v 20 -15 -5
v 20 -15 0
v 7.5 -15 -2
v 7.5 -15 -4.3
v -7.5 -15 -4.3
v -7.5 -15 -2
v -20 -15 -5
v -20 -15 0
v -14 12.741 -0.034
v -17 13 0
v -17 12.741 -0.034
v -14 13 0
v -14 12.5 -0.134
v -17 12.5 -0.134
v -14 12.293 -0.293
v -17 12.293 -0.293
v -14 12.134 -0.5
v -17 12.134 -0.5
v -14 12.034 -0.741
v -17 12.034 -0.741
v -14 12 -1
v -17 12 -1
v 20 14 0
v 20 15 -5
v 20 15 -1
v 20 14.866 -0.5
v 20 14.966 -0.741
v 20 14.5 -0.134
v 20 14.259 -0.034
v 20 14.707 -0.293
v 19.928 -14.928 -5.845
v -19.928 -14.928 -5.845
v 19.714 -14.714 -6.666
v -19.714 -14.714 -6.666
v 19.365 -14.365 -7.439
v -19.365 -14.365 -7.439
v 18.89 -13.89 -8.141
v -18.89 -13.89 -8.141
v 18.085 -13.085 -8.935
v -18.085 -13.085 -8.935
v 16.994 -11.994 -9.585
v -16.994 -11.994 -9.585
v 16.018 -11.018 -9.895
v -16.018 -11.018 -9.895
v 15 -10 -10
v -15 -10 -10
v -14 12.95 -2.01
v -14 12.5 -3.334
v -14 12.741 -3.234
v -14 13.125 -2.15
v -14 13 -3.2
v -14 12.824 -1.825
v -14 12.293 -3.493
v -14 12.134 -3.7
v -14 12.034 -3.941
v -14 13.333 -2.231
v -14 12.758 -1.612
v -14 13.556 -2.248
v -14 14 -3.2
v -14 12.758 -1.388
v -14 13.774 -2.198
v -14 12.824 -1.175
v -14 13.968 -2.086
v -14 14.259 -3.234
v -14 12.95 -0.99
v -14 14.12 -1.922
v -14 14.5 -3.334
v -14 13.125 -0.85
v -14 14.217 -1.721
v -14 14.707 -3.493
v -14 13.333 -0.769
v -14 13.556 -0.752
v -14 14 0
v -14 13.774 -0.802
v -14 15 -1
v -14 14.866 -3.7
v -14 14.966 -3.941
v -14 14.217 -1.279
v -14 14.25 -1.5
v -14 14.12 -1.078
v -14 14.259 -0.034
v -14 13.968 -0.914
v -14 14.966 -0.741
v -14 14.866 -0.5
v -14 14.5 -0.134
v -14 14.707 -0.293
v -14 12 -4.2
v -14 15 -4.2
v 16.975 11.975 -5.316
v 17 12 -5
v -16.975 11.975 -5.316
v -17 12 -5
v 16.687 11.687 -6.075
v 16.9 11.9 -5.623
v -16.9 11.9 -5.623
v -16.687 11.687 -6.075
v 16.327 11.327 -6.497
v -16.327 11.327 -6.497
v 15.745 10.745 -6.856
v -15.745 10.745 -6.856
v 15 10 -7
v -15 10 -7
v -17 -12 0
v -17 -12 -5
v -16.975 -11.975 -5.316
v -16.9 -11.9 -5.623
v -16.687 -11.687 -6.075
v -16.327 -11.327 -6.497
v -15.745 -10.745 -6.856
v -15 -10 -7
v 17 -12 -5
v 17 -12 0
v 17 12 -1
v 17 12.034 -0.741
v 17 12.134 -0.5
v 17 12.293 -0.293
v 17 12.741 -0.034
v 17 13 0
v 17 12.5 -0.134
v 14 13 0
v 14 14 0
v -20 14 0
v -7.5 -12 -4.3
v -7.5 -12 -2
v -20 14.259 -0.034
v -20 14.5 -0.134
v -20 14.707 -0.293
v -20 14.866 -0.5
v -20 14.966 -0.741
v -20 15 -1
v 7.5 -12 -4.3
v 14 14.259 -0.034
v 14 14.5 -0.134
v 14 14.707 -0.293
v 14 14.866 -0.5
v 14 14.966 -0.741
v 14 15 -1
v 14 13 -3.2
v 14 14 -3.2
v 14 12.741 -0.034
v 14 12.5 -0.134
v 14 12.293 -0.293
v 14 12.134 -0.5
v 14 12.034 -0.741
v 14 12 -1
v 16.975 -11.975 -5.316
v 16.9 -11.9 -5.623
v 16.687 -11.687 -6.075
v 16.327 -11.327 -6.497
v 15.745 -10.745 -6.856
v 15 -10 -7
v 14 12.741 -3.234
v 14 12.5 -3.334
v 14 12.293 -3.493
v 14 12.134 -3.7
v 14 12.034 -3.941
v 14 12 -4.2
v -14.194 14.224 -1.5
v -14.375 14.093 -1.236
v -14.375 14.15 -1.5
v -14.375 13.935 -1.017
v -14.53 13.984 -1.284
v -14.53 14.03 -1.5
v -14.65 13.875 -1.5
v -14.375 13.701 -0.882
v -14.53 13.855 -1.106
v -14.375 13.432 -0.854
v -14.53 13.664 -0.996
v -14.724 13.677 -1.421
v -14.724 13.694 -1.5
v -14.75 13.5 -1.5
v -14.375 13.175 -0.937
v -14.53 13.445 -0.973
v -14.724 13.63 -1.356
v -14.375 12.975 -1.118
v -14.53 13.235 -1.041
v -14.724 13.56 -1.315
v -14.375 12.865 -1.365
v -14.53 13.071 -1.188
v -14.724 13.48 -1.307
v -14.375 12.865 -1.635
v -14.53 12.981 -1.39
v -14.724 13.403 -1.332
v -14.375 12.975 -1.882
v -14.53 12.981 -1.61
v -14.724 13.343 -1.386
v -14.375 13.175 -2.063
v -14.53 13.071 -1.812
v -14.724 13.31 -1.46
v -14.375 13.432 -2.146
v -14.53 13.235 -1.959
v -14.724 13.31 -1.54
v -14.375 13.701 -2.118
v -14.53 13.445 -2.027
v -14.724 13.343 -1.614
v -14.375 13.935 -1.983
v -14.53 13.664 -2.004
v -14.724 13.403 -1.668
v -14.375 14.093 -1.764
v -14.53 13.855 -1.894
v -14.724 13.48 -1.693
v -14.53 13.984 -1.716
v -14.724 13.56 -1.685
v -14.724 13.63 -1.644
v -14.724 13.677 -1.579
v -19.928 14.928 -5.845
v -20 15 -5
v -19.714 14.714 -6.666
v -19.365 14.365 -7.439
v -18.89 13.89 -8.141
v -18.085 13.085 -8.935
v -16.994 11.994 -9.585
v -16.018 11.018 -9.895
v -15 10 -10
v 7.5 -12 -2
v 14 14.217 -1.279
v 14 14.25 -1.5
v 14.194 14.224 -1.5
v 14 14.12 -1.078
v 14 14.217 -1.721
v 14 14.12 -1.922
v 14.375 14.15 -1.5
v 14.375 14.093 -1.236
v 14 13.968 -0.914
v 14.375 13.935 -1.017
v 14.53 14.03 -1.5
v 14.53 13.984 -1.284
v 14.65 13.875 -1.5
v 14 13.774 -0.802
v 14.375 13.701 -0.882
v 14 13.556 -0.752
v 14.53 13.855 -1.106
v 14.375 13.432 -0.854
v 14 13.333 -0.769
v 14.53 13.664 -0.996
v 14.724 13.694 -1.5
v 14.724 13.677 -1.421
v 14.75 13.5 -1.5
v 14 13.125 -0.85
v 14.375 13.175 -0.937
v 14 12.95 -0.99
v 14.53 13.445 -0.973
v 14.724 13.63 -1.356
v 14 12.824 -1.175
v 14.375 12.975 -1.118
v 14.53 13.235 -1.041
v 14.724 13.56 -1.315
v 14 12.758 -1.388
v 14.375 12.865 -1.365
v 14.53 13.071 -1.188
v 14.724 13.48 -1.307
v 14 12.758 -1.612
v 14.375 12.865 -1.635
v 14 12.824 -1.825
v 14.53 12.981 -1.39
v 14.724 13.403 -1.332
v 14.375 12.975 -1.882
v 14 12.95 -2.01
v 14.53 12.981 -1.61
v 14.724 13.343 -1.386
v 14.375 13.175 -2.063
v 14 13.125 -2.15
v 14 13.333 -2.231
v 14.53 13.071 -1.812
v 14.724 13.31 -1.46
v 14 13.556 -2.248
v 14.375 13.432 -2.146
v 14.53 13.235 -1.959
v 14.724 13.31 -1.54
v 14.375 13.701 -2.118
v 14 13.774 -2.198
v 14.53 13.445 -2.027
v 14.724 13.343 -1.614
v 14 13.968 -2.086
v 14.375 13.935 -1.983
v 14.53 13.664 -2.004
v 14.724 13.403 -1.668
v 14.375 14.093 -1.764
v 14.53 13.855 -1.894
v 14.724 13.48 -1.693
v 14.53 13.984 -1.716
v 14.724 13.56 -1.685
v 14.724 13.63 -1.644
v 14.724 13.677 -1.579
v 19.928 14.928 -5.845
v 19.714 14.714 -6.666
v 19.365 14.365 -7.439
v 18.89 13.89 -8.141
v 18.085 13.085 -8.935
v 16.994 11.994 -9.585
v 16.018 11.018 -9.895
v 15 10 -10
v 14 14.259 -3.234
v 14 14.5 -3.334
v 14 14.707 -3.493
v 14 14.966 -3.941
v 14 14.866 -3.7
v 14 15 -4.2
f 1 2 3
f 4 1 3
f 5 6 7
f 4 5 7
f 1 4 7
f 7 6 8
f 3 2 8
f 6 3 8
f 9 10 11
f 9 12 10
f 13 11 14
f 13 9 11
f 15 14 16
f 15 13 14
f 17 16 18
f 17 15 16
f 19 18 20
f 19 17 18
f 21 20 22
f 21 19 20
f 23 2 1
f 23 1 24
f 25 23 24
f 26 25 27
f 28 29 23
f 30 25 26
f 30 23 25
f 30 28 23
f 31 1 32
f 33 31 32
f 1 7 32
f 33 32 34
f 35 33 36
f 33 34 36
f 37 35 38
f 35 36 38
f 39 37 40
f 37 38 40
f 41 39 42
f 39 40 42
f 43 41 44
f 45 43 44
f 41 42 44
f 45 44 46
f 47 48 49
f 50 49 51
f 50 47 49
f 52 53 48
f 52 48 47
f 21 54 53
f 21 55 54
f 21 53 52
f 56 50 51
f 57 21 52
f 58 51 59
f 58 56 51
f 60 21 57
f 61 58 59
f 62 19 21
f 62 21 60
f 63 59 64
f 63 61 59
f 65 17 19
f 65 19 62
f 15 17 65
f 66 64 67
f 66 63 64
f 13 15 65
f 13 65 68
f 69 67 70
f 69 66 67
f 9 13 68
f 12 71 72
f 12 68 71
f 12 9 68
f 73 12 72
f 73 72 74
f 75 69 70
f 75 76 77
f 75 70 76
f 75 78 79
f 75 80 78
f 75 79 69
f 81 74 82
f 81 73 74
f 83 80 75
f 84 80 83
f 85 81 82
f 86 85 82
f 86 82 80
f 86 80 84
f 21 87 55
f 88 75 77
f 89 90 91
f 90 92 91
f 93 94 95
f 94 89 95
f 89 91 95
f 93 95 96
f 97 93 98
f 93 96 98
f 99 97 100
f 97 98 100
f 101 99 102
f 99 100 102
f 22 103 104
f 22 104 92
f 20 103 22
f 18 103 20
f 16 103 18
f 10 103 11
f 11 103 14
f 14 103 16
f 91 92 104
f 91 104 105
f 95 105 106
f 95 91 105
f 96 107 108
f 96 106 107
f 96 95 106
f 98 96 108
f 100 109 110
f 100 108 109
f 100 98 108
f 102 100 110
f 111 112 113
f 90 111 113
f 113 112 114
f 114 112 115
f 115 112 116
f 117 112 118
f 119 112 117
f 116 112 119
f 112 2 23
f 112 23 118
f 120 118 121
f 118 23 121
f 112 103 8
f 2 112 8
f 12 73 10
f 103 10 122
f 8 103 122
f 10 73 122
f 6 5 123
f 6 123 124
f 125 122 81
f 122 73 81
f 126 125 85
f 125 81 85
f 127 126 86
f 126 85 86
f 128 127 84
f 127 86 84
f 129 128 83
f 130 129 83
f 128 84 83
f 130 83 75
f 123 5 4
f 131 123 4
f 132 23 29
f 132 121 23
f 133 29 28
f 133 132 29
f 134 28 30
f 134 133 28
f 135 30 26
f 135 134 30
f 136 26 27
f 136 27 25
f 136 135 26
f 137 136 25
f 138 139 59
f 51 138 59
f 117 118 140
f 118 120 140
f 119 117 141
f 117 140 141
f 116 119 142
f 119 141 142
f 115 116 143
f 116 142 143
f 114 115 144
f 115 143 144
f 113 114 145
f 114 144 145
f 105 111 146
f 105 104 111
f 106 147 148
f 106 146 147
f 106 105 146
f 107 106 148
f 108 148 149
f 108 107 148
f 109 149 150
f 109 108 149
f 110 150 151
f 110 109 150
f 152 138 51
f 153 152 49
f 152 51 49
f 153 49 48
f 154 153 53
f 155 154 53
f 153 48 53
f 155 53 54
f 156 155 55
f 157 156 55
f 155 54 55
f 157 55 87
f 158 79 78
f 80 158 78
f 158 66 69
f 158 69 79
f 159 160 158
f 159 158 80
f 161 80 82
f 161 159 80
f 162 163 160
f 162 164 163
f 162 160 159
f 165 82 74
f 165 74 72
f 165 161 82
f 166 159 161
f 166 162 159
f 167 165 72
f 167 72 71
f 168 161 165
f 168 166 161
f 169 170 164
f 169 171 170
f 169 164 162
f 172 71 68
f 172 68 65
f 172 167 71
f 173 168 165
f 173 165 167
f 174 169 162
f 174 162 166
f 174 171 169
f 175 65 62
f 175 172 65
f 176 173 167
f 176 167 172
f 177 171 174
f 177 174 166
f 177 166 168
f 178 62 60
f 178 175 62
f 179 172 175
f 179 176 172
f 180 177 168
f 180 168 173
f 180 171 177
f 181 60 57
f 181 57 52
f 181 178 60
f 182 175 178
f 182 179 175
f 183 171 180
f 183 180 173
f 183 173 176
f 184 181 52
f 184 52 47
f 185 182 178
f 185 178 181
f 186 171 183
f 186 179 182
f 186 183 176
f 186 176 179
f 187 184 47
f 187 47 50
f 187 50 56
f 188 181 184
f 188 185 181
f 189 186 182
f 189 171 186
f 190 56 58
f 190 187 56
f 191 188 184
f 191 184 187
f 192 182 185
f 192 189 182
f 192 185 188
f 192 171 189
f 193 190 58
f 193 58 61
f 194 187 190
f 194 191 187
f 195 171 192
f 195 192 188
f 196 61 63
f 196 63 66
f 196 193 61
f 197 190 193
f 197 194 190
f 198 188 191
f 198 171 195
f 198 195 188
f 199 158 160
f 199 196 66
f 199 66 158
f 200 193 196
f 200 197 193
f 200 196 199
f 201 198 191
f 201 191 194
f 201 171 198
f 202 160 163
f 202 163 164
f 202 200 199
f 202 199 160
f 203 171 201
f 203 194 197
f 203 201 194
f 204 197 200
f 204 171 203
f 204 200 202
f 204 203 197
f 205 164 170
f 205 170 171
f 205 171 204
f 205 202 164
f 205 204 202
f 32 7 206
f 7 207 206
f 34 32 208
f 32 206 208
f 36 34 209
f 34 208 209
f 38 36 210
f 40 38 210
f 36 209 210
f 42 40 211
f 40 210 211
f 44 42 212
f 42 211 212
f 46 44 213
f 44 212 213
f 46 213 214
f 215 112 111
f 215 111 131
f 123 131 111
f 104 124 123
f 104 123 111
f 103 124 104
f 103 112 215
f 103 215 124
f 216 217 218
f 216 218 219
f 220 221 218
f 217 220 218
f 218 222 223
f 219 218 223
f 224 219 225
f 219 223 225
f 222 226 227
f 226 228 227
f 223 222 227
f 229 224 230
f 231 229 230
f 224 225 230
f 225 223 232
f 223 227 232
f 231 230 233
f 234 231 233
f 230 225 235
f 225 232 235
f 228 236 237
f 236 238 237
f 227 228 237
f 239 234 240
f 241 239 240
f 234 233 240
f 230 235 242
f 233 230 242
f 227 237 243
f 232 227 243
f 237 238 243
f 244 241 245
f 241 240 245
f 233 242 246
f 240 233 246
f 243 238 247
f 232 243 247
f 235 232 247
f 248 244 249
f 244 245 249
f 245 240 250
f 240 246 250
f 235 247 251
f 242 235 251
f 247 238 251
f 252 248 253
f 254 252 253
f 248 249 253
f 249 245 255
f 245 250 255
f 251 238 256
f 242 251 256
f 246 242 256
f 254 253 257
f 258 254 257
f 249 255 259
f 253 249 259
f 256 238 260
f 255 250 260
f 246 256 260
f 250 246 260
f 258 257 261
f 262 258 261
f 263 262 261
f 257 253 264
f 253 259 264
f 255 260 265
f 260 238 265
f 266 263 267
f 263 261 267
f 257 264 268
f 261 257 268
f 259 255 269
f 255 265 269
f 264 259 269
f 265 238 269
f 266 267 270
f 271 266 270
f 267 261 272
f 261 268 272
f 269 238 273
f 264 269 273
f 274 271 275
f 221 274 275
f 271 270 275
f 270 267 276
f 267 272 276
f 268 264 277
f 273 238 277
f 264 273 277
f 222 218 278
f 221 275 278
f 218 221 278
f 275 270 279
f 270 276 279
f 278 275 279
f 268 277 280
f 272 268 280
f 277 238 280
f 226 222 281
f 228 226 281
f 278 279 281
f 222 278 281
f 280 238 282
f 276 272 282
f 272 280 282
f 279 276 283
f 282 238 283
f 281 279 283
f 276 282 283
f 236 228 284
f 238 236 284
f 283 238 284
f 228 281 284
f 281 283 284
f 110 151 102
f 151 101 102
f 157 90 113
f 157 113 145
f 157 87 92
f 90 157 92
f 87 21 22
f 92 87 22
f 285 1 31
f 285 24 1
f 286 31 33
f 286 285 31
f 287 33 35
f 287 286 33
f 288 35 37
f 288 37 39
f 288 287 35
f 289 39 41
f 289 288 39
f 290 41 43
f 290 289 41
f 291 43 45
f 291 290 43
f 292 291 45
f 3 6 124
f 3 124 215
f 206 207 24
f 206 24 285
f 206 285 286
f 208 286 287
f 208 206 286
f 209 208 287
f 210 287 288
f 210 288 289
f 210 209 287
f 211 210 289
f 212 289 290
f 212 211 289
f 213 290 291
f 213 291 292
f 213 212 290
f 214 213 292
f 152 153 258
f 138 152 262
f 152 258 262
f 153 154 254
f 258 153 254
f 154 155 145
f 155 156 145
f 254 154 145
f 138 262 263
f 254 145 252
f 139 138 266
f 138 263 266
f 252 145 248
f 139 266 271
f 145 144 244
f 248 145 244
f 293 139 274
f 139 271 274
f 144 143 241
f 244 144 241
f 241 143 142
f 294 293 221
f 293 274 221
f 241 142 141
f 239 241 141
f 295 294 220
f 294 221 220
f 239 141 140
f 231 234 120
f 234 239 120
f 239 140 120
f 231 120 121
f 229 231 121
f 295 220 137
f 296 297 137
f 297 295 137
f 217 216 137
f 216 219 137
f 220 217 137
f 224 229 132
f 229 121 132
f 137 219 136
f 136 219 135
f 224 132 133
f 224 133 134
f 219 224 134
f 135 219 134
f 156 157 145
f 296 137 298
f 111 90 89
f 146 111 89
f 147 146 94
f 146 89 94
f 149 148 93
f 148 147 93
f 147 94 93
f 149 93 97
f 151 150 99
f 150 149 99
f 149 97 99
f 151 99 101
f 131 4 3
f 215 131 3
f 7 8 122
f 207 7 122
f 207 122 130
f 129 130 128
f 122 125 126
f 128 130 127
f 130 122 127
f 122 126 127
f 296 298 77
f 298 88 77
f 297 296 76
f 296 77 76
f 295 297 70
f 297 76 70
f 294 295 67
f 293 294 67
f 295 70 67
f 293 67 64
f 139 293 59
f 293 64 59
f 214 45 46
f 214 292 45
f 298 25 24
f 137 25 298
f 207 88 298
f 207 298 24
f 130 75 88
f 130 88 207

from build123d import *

# Parameters (mm, degrees)
F0_W      = 40
F0_H      = 30
F1_DEPTH  = 10
F2_R      = 5
F3_T      = -3
F4_W      = 28
F4_H      = 3
F5_DEPTH  = 3
F6_W      = 32.3581136763
F6_H      = 60.2468792349
F7_DEPTH  = 25
F8_R      = 0.75
F9_DEPTH  = 0.75
F10_R     = 0.74999
F11_W     = 14
F11_H     = 3
F12_DEPTH = 0.2
F13_R     = 1
F15_W     = 15
F15_H     = 2.3
F16_DEPTH = 3


# Not quite as in the source:
# - a fillet or chamfer is up to 0.001 mm smaller than in the source, because OpenCascade refuses the exact size


with BuildPart() as f1:
    # F0 (on Top) → F1 (new body)
    with BuildSketch(Plane.XY):
        Rectangle(F0_W, F0_H)
    extrude(amount=-F1_DEPTH)

    # F2
    f2_edges = [f1.edges().sort_by_distance(p)[0] for p in [
        (20, 0, -10),
        (0, 15, -10),
        (-20, 0, -10),
        (0, -15, -10),
    ]]
    fillet(f2_edges, radius=F2_R)

    # F3
    f3_openings = [f1.faces().sort_by_distance(p)[0] for p in [
        (0, 0, 0),
    ]]
    offset(amount=F3_T, openings=f3_openings)

    # F4 (on face) → F5 (cut)
    with BuildSketch(Plane.XY):
        with Locations((0, 13.5)):
            Rectangle(F4_W, F4_H)
    extrude(amount=-F5_DEPTH, mode=Mode.SUBTRACT)

    # F6 (on Top) → F7 (cut)
    with BuildSketch(Plane.XY):
        with Locations((16.1790568382, -2.0559011027)):
            Rectangle(F6_W, F6_H)
    extrude(amount=-F7_DEPTH, mode=Mode.SUBTRACT)

    # F8 (on face) → F9 (cut)
    with BuildSketch(Plane.YZ.offset(-14)):
        with Locations((13.5, -1.5)):
            Circle(F8_R)
    extrude(amount=-F9_DEPTH, mode=Mode.SUBTRACT)

    # F10 (radius 0.75 in the source; OpenCascade refuses exactly that, so slightly less here)
    f10_edges = [f1.edges().sort_by_distance(p)[0] for p in [
        (-14.75, 12.75, -1.5),
    ]]
    fillet(f10_edges, radius=F10_R)

    # F11 (on face) → F12 (cut)
    with BuildSketch(Plane.XY.offset(-3)):
        with Locations((-7, 13.5)):
            Rectangle(F11_W, F11_H)
    extrude(amount=-F12_DEPTH, mode=Mode.SUBTRACT)

    # F13
    f13_edges = [f1.edges().sort_by_distance(p)[0] for p in [
        (-17, 15, 0),
        (-15.5, 12, 0),
        (-7, 15, -3.2),
        (-7, 12, -3.2),
    ]]
    fillet(f13_edges, radius=F13_R)

    # F14: F1 across plane


with BuildPart() as f1_1:
    add(f1.part)
    add(f1.part.mirror(Plane.YZ))

    # F15 (on face) → F16 (cut, through all)
    with BuildSketch(Plane.XZ.offset(15)):
        with Locations((0, -3.15)):
            Rectangle(F15_W, F15_H)
    extrude(amount=-F16_DEPTH, mode=Mode.SUBTRACT)


solid = f1_1.part
